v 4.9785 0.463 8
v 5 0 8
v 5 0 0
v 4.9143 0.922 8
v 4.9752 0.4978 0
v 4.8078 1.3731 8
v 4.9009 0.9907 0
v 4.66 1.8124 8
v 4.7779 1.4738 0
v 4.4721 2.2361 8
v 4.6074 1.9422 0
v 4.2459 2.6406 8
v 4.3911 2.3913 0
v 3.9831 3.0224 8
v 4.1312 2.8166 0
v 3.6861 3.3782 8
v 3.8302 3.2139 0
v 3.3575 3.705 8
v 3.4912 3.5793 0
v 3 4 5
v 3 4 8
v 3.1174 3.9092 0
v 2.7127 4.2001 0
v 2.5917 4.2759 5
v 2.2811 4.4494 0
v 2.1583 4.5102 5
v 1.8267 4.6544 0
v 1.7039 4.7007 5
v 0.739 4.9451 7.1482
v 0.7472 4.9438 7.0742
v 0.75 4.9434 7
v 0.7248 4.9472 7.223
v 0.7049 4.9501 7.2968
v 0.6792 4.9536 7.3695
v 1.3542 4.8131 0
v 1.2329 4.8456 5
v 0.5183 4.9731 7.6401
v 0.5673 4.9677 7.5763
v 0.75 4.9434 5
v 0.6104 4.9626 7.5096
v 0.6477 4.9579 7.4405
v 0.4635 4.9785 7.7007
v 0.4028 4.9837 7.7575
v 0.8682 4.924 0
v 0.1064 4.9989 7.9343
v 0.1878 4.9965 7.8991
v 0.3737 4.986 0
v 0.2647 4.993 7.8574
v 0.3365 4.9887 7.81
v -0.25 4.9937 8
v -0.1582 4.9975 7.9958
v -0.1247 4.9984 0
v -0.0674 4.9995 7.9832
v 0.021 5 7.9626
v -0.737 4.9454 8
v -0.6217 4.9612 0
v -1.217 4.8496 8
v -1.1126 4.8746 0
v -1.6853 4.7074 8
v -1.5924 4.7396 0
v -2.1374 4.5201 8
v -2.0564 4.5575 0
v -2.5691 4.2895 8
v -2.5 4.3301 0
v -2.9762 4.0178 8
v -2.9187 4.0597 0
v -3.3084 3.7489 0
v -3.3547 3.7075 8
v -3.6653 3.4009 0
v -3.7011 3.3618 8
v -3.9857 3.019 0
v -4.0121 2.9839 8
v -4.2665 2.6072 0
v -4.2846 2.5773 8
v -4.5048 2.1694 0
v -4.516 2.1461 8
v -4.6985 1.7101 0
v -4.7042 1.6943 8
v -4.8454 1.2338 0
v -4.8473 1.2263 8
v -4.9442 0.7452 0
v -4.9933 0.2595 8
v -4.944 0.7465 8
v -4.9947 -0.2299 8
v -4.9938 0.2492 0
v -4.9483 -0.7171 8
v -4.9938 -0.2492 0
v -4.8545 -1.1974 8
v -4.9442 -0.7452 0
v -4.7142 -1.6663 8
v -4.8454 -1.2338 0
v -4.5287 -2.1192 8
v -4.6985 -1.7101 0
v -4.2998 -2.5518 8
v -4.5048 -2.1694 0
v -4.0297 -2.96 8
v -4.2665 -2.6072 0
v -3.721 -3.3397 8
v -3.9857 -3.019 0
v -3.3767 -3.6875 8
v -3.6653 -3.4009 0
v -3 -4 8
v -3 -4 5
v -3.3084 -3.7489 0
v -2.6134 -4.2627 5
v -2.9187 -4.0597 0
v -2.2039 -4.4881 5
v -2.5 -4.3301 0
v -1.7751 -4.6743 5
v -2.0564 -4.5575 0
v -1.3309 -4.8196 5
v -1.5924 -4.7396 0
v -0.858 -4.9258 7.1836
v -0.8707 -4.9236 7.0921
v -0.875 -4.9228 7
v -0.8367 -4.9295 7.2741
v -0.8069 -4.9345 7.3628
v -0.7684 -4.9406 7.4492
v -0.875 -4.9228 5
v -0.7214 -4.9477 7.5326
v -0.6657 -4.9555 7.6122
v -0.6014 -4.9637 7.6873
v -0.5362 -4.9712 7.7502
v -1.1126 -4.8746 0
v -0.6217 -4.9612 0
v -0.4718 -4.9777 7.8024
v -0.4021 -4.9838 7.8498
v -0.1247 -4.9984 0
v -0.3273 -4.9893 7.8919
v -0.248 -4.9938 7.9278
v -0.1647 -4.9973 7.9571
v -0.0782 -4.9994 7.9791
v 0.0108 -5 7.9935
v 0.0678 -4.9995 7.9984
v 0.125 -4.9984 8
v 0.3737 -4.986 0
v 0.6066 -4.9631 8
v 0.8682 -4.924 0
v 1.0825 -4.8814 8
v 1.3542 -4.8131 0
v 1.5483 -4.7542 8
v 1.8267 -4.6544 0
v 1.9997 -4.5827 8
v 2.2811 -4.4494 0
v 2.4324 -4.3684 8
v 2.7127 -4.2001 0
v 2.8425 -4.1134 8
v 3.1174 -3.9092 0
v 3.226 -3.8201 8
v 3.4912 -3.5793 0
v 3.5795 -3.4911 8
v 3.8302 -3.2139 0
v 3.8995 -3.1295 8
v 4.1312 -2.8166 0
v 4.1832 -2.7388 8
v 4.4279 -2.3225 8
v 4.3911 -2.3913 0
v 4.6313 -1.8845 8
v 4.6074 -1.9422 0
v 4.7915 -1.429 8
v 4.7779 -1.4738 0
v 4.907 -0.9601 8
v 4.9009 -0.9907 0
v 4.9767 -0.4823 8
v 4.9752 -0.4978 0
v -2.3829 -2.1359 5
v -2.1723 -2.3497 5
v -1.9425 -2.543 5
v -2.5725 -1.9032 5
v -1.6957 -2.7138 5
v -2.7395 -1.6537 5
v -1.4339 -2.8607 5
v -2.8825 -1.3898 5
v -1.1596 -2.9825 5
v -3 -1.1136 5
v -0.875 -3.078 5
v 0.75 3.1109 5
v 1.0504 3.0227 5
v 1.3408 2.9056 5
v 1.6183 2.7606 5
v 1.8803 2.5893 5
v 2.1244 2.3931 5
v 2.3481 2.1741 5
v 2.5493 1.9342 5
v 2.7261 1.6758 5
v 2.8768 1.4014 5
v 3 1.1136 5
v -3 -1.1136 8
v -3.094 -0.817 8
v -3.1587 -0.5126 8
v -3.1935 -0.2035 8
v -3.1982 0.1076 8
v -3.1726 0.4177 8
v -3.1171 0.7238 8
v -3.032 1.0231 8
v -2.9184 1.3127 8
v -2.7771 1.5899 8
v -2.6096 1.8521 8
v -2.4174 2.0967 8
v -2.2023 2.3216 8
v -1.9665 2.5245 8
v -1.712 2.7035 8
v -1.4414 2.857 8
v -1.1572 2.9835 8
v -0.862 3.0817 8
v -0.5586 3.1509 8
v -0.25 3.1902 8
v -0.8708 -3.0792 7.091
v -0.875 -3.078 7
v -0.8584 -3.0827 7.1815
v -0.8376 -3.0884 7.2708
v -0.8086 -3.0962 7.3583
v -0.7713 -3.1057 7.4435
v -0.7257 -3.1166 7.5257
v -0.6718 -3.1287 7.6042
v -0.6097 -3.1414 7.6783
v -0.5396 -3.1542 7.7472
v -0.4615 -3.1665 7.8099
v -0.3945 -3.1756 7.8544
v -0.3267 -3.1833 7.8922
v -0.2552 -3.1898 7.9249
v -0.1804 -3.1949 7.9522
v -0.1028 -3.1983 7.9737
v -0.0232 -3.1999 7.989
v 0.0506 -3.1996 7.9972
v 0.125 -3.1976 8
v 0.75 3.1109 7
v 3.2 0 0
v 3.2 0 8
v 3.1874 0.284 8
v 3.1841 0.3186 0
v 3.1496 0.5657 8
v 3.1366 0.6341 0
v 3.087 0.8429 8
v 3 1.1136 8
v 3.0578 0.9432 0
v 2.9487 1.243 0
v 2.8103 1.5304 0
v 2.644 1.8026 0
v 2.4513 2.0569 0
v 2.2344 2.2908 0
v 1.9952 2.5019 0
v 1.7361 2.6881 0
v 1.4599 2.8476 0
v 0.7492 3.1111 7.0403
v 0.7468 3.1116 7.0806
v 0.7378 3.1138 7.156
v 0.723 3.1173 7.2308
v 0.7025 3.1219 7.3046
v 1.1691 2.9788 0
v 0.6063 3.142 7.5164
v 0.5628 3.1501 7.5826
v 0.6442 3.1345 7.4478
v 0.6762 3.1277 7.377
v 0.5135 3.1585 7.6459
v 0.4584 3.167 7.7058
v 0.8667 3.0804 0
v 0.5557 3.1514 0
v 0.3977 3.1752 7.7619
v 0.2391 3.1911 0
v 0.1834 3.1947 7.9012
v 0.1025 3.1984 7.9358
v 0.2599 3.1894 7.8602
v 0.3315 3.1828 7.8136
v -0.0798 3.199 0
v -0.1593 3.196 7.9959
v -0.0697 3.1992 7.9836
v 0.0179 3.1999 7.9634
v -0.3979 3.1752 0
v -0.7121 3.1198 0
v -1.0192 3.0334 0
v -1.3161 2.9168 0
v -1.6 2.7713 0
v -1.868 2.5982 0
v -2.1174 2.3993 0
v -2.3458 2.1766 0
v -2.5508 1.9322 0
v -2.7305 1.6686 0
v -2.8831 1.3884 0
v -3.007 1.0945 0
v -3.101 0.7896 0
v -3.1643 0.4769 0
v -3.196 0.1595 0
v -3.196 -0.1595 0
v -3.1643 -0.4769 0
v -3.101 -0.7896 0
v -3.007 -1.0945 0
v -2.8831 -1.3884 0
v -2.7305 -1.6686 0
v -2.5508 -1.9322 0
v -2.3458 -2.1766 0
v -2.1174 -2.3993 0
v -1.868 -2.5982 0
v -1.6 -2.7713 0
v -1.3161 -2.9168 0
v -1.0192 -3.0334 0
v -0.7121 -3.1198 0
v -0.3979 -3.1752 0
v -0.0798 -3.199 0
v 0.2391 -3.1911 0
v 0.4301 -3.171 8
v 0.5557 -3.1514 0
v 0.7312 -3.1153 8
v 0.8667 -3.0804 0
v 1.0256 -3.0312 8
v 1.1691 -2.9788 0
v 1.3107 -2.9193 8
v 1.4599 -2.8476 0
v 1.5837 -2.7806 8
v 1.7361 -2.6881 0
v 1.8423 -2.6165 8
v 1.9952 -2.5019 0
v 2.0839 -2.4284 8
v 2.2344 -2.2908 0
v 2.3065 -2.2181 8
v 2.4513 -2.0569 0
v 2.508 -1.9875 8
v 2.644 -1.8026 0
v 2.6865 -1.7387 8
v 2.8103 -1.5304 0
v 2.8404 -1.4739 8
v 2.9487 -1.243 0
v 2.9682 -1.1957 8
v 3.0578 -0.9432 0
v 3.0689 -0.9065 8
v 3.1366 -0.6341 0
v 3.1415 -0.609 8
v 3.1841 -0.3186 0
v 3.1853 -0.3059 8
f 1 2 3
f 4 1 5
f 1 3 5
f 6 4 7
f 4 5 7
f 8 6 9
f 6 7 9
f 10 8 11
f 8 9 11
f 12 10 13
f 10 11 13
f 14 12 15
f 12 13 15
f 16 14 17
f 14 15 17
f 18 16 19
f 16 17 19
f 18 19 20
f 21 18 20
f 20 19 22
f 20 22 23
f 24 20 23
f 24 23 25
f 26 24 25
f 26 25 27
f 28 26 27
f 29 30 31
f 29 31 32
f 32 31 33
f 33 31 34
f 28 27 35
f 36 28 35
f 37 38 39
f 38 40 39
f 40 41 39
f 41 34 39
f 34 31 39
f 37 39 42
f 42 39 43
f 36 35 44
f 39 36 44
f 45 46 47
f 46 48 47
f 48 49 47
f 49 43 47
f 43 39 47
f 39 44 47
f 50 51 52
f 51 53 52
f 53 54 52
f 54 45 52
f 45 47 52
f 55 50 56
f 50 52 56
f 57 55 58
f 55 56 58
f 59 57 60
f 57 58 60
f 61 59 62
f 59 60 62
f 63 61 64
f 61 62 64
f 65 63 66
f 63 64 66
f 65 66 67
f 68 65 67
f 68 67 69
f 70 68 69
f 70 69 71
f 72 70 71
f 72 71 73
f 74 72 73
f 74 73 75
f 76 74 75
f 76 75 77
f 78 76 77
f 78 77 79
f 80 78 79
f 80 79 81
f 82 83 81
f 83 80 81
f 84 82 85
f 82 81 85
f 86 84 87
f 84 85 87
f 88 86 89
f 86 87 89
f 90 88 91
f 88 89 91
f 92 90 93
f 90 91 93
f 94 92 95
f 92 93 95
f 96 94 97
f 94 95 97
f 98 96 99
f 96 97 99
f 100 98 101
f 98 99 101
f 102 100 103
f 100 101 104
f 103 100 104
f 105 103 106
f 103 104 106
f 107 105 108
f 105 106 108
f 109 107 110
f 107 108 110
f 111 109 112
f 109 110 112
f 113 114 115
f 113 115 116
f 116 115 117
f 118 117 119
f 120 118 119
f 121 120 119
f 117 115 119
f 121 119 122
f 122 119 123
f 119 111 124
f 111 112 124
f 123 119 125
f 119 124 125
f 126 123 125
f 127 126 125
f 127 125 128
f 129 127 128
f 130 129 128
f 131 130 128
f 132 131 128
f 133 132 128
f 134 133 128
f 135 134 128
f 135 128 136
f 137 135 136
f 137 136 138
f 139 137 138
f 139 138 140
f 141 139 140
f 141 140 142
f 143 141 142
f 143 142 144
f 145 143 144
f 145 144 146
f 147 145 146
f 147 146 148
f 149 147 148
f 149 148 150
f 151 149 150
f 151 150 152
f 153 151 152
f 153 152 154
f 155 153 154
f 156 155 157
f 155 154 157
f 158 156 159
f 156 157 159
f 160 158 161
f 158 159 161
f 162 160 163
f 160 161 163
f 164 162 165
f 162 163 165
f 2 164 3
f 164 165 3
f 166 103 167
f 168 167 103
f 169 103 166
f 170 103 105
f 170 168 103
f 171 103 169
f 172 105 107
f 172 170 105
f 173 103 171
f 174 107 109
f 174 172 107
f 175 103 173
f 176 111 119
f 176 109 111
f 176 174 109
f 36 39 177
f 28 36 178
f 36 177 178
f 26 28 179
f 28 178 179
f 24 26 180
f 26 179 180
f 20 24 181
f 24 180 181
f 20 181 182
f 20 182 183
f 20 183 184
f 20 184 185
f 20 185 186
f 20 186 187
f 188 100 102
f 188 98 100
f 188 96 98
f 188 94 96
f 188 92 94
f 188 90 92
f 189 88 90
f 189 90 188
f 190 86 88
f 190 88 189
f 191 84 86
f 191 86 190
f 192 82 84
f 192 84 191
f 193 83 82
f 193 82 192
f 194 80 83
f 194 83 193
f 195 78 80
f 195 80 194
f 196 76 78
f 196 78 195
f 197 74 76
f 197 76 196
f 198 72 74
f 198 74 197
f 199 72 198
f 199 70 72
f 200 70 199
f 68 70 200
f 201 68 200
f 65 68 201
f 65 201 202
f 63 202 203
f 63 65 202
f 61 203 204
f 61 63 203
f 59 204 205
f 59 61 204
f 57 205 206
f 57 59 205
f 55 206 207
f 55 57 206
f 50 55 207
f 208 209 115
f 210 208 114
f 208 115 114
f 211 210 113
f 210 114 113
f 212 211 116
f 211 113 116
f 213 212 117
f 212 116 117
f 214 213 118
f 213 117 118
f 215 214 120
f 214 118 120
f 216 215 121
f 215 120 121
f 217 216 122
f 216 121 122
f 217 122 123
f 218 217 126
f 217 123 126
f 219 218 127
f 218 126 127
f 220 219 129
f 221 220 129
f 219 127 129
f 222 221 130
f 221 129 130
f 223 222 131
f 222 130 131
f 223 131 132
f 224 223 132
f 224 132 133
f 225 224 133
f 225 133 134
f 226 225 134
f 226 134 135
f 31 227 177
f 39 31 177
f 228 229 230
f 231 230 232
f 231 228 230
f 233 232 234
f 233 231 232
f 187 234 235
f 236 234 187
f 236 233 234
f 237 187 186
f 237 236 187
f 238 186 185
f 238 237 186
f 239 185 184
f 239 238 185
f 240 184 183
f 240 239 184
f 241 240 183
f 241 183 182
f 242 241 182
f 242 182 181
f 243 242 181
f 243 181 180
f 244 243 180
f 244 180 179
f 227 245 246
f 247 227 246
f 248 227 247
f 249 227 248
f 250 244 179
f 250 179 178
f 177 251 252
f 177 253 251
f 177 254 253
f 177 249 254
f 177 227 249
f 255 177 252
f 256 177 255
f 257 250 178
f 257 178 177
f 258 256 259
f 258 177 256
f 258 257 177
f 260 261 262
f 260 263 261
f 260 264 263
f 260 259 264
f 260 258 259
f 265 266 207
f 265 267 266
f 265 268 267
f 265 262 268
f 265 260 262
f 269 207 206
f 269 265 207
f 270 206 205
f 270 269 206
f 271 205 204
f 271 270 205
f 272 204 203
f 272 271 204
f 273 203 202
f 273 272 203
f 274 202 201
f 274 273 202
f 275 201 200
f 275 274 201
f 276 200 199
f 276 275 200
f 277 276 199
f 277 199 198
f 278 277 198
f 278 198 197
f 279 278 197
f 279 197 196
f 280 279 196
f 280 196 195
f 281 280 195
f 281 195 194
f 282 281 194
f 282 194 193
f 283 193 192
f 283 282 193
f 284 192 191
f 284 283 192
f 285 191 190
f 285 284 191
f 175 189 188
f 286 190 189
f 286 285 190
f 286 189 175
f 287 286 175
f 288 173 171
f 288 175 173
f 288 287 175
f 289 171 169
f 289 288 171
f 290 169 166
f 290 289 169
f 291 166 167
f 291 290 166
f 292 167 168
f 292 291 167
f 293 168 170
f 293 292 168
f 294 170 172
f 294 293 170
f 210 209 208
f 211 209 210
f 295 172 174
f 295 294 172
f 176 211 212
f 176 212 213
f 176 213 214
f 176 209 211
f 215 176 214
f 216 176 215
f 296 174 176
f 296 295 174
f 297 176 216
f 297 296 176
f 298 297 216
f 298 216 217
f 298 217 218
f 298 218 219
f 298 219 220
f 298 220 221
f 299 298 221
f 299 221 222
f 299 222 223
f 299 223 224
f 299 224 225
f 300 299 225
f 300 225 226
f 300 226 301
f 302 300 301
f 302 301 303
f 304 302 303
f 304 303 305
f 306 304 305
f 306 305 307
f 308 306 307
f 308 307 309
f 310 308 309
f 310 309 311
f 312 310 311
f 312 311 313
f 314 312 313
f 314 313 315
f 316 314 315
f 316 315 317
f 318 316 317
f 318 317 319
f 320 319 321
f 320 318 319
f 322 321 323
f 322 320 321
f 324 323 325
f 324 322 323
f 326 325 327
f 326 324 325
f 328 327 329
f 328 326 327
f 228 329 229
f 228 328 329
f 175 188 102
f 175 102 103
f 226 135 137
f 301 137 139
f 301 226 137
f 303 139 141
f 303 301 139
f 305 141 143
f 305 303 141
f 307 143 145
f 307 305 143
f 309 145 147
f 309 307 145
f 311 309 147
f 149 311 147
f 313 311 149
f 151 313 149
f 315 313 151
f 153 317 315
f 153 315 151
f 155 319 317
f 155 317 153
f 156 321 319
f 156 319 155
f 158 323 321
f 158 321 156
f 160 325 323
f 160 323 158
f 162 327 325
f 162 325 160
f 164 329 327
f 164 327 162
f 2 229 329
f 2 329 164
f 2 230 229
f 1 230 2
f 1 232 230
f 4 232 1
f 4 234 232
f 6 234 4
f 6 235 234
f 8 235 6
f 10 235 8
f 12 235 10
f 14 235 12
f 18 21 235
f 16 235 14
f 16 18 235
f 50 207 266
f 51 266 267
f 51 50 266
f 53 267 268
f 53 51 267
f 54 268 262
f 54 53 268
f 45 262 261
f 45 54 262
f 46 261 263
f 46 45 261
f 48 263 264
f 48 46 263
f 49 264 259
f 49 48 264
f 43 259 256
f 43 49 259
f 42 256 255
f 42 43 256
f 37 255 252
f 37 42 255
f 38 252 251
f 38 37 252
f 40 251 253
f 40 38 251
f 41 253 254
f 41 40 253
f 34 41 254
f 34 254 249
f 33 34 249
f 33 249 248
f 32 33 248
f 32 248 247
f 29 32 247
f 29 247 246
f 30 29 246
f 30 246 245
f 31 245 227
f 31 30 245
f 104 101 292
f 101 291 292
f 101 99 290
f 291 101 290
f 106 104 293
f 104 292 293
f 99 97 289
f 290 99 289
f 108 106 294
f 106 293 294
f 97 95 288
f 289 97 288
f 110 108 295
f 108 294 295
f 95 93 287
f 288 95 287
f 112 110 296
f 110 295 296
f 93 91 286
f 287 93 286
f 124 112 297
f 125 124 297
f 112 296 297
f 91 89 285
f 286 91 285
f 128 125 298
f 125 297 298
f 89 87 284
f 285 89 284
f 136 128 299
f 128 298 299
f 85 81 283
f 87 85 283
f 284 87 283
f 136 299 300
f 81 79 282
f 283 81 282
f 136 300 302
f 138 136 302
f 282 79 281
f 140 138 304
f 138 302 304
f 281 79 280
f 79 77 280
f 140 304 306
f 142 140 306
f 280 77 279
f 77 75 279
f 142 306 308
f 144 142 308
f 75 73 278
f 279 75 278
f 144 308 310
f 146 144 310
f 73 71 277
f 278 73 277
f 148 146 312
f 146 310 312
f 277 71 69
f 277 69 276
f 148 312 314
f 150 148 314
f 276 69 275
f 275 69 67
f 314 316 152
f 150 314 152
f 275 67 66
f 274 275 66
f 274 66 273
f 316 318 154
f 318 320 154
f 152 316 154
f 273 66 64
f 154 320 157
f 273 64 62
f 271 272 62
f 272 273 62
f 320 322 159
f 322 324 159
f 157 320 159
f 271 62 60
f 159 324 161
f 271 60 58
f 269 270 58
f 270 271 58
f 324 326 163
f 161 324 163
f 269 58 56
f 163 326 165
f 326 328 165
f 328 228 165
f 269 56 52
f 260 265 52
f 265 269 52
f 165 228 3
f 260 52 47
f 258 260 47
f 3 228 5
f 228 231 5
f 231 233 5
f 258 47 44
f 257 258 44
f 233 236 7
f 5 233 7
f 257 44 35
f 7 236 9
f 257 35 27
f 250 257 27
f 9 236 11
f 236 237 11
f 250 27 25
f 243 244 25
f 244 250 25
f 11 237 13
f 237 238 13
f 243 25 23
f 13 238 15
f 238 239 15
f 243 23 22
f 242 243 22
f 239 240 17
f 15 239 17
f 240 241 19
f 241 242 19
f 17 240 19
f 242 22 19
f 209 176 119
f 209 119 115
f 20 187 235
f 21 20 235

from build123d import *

# Parameters (mm, degrees)
PAD002_DEPTH = 10
PAD001_DEPTH = 10
SKETCH_R     = 5
SKETCH_R_2   = 3.2
PAD_DEPTH    = 12
FILLET_R     = 1


with BuildPart() as pad002:
    # Sketch002 → Pad002 (new body)
    with BuildSketch(Plane.XZ):
        Polygon((-5, 8), (0.75, 8), (0.75, 5), (3, 5), (3, 8), (5, 8), (5, 12), (-5, 12), align=None)
    extrude(amount=-PAD002_DEPTH)


with BuildPart() as pad001:
    # Sketch001 → Pad001 (new body)
    with BuildSketch(Plane.XZ):
        Polygon((5, 8), (5, 12), (-5, 12), (-5, 8), (-3, 8), (-3, 5), (-0.875, 5), (-0.875, 8), align=None)
    extrude(amount=PAD001_DEPTH)


with BuildPart() as fillet_body:
    # Sketch → Pad (new body)
    with BuildSketch(Plane.XY):
        Circle(SKETCH_R)
        Circle(SKETCH_R_2, mode=Mode.SUBTRACT)
    extrude(amount=PAD_DEPTH)

    # Cut: cut Pad001
    add(pad001.part, mode=Mode.SUBTRACT)

    # Cut001: cut Pad002
    add(pad002.part, mode=Mode.SUBTRACT)

    # Fillet
    fillet_edges = [fillet_body.edges().sort_by_distance(p)[0] for p in [
        (-0.875, -4.000445, 8),
        (0.75, 4.027149, 8),
    ]]
    fillet(fillet_edges, radius=FILLET_R)


solid = fillet_body.part
